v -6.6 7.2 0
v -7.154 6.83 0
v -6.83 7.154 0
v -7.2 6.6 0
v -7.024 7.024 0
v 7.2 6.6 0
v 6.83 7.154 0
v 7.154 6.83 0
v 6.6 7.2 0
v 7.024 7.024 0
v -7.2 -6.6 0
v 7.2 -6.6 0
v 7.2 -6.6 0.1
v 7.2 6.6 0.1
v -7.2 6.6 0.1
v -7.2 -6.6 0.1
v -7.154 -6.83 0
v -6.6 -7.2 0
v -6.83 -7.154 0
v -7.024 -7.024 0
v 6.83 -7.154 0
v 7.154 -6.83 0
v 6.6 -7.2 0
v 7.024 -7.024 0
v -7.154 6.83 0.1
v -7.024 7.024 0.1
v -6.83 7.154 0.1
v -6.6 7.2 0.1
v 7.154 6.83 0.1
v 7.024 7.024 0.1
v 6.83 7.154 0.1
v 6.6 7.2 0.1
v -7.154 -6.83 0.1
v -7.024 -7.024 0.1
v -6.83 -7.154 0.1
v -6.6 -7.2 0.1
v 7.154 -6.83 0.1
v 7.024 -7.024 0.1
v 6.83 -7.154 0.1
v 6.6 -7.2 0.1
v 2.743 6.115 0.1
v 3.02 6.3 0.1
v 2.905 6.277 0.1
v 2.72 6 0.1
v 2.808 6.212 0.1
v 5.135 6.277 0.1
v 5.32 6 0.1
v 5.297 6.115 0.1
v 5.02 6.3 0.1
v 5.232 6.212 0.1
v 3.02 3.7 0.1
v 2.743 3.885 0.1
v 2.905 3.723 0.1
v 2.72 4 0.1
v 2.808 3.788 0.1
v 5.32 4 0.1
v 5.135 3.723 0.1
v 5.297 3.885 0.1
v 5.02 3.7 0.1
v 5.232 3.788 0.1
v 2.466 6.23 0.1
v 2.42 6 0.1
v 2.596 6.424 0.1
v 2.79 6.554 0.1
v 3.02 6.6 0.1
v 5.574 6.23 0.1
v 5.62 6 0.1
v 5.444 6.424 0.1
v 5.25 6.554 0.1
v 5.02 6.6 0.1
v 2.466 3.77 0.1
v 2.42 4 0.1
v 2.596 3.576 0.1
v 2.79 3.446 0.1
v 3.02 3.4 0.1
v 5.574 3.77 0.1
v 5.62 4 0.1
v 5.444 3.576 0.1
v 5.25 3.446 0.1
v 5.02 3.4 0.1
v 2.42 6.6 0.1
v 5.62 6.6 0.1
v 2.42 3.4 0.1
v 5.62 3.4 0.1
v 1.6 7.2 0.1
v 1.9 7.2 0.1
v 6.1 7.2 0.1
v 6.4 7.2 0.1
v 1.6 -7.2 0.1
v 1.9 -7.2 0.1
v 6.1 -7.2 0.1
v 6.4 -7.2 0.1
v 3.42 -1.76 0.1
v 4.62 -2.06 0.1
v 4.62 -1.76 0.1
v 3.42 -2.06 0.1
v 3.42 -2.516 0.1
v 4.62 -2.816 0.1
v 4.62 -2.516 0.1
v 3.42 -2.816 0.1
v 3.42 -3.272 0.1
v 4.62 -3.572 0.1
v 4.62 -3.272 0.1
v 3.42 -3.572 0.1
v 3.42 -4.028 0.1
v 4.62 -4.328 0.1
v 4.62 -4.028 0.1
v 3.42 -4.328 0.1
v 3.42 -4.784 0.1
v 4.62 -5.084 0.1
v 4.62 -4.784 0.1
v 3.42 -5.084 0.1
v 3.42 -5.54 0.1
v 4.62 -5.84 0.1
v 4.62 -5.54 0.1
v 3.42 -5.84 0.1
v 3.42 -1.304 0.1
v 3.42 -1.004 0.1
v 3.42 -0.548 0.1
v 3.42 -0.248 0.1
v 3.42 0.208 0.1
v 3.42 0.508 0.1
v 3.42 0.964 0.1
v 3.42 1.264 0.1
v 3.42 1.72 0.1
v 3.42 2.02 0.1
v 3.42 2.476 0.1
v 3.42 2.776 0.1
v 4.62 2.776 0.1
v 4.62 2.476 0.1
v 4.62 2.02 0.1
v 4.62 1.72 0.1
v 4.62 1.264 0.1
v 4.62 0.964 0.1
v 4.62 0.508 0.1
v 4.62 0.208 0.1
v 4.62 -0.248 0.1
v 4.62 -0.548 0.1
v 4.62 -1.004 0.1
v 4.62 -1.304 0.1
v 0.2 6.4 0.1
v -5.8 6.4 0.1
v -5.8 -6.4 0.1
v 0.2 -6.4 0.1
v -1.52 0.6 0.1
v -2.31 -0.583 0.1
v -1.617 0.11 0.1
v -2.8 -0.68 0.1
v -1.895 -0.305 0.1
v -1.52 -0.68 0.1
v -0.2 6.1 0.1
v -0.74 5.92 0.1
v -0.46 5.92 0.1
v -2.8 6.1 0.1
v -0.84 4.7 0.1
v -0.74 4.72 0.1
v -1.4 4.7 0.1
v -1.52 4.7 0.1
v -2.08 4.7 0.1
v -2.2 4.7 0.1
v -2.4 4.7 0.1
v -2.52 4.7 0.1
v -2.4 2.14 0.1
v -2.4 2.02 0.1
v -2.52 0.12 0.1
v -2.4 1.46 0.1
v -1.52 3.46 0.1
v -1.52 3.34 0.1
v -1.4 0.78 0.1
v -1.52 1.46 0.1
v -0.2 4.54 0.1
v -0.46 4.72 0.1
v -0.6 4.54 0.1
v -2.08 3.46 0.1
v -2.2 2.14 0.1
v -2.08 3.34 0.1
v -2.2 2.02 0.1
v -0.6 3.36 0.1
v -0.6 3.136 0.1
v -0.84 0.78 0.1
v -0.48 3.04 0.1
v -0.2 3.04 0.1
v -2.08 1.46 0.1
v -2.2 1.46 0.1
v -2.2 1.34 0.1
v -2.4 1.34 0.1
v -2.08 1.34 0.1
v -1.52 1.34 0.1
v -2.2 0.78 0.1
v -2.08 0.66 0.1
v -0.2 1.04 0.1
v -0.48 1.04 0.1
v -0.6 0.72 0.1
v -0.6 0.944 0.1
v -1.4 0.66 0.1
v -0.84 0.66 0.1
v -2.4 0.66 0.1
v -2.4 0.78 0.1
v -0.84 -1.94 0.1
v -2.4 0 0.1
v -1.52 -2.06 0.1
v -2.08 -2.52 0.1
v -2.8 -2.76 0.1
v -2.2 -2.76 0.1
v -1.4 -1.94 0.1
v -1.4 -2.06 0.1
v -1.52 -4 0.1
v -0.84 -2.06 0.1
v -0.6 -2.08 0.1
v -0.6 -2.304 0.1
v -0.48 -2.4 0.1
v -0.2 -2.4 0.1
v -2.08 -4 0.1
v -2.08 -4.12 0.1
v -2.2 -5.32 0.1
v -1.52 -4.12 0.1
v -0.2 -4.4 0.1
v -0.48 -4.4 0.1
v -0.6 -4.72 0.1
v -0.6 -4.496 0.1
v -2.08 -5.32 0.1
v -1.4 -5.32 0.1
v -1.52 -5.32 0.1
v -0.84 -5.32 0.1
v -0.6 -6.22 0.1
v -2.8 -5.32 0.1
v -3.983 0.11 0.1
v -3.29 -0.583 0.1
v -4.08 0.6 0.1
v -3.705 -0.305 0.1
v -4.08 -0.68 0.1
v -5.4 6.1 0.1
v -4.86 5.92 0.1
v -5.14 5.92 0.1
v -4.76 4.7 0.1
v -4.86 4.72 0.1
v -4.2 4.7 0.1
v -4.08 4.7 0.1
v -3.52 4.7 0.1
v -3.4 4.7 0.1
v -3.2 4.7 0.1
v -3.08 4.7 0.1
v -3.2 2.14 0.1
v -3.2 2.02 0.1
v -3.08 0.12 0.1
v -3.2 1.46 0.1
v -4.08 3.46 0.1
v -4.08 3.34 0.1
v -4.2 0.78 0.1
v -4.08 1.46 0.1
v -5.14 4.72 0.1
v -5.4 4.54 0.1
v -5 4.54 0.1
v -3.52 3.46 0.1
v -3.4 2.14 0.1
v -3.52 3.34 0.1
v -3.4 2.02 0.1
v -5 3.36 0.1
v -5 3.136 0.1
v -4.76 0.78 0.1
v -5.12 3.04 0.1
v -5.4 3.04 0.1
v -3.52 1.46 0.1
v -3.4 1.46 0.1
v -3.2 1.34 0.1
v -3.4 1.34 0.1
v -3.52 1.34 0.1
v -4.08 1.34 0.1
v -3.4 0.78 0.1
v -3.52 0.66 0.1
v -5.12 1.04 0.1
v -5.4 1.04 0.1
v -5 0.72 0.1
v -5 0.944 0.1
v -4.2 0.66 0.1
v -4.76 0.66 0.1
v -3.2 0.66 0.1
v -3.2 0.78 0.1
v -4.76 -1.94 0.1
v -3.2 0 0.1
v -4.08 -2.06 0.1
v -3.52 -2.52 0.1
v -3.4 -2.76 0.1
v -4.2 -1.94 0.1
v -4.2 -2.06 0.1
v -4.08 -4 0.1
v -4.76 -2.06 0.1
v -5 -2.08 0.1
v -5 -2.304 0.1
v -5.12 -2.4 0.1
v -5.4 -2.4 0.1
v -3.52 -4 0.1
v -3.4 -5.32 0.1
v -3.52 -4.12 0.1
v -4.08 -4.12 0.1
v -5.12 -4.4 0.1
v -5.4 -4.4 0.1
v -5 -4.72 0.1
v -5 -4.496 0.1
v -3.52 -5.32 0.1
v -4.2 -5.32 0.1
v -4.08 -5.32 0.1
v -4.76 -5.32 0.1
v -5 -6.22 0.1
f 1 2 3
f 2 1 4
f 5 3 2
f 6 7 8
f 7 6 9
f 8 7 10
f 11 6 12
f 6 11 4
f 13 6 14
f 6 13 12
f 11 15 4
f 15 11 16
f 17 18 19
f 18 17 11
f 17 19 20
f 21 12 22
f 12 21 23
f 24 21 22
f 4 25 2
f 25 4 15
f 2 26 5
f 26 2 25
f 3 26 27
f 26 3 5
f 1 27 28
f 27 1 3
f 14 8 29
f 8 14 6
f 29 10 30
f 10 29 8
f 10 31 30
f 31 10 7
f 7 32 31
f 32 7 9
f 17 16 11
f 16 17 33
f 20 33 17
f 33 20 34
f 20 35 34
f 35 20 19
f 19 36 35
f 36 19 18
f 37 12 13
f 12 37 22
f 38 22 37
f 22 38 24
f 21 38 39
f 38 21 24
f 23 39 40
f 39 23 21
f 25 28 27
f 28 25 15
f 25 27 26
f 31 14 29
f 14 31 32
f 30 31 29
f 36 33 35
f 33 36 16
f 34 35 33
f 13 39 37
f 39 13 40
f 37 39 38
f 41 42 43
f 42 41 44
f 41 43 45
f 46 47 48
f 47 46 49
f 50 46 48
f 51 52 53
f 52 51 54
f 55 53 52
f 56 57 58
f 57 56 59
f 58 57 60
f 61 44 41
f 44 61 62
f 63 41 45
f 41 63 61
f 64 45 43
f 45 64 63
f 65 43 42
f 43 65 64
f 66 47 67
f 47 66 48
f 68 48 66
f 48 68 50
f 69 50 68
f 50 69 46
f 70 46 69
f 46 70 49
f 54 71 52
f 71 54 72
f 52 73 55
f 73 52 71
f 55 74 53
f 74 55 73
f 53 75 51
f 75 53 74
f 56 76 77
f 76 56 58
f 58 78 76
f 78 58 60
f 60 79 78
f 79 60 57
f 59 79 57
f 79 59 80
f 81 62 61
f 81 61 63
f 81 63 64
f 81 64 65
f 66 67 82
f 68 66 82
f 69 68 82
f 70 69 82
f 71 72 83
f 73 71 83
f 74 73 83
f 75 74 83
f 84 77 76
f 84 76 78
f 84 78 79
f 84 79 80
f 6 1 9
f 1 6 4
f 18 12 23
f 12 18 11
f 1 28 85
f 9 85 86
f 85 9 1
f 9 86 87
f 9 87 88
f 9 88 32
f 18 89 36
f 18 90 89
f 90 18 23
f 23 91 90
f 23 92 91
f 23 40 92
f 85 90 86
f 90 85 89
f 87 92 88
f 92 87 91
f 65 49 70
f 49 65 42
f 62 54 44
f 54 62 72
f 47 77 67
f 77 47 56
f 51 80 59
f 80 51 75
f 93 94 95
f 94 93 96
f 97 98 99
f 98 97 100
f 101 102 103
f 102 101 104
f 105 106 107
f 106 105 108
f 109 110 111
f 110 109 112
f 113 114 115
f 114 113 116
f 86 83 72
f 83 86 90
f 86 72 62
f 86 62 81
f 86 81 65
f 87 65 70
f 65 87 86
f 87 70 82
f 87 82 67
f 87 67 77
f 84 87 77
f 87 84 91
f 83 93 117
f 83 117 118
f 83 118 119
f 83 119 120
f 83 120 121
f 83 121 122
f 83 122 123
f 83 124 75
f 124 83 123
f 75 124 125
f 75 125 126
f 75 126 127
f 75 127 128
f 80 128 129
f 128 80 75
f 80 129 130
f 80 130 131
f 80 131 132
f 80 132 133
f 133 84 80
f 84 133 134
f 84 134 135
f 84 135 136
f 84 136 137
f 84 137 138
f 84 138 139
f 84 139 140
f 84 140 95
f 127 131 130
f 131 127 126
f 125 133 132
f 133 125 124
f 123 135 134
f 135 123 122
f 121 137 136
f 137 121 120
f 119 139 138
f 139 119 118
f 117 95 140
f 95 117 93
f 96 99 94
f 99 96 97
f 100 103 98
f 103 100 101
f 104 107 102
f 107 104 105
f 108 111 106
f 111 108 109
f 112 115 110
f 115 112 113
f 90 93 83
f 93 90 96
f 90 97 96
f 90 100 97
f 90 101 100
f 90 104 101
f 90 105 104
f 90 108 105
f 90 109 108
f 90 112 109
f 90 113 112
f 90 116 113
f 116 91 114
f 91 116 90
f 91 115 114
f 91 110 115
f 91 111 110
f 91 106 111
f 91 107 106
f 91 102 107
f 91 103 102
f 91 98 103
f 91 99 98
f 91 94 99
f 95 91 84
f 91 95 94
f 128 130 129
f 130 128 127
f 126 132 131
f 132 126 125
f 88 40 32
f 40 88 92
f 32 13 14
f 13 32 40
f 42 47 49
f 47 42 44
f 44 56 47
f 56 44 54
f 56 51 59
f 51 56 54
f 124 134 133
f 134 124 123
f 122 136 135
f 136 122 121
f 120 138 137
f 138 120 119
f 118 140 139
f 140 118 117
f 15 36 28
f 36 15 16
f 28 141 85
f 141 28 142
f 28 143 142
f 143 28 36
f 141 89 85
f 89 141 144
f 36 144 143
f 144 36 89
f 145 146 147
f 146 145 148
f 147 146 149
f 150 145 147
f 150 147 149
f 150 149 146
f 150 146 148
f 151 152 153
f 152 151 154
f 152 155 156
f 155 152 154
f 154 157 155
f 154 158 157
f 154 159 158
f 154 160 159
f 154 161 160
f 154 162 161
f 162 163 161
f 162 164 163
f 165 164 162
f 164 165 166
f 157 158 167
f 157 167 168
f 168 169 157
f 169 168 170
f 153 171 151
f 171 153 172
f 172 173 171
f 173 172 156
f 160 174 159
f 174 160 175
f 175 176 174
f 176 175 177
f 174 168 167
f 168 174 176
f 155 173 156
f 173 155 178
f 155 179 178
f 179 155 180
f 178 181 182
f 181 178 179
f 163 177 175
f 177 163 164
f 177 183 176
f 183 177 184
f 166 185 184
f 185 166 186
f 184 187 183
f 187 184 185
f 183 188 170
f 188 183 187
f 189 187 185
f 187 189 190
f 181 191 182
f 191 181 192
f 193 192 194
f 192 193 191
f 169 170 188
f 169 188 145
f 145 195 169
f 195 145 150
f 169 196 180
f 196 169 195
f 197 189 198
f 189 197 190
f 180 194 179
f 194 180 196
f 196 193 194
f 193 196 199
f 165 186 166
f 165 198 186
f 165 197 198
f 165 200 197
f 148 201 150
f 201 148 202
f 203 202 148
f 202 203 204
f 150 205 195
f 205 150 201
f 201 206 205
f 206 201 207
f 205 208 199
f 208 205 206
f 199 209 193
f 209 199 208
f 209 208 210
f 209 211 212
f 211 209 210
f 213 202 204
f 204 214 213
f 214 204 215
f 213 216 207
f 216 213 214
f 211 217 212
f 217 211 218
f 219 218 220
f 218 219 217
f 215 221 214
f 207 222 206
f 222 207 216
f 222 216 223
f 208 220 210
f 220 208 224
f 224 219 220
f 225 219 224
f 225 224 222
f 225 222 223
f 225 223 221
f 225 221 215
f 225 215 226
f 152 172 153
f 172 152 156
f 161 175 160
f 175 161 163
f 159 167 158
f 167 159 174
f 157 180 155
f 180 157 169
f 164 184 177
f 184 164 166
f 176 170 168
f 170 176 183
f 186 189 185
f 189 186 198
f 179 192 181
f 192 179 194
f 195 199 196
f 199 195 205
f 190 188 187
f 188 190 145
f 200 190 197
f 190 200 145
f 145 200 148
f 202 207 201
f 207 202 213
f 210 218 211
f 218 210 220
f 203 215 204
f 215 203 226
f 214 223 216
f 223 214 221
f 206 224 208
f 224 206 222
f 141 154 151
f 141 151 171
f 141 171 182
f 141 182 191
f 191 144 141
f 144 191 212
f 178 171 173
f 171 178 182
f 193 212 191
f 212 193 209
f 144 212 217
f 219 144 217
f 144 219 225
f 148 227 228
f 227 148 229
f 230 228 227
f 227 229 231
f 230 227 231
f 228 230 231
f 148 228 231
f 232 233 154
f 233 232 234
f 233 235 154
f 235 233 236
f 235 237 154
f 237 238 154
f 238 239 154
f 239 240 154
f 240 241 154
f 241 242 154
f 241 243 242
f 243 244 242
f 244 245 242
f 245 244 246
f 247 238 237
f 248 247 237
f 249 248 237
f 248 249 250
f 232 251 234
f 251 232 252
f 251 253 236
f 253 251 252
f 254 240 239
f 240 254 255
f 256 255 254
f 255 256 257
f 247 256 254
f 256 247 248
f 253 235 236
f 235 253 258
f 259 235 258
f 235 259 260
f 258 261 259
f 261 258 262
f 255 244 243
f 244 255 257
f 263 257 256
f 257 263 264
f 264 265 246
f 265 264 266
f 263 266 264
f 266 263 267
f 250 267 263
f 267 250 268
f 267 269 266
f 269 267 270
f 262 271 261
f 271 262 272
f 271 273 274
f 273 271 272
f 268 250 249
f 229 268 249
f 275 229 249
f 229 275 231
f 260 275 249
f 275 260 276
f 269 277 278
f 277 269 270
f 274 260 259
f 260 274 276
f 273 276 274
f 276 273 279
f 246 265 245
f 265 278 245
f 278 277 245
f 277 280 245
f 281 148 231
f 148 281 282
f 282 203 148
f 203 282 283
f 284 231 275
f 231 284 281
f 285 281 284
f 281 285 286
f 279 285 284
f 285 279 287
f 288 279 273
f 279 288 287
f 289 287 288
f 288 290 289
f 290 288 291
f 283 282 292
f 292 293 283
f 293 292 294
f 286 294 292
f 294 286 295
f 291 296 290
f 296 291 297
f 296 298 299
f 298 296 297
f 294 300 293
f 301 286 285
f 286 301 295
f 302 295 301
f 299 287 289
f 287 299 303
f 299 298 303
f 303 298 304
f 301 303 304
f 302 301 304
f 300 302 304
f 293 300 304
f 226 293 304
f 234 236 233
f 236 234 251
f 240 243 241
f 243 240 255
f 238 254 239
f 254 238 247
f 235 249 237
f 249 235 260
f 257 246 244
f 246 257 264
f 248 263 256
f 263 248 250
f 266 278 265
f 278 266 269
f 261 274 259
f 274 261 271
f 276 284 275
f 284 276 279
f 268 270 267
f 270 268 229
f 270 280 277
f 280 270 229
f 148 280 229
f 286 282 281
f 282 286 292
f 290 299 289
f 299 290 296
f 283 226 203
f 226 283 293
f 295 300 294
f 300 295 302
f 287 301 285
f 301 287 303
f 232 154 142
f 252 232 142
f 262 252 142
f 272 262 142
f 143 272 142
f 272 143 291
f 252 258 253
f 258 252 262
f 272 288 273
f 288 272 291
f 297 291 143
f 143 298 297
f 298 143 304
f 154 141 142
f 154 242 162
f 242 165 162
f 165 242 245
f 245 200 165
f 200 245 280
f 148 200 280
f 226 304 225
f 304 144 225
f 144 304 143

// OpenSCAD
// file: ../p/box3u12.scad
use <../lib.scad>
function ldraw_lib__box3u12() = [
// 0 Box with 3 Parallel Faces without Any Edges
// 0 Name: box3u12.dat
// 0 Author: J.C. Tchang [tchang]
// 0 !LDRAW_ORG Primitive UPDATE 2014-02
// 0 !LICENSE Licensed under CC BY 4.0 : see CAreadme.txt
// 
// 0 BFC CERTIFY CCW
  [0,"BFC","CERTIFY"],
  [0,"BFC","CCW"],
// 
// 0 !HISTORY 2014-12-23 [PTadmin] Official Update 2014-02
// 
// 
// 4 16 -1 1 1 1 1 1 1 1 -1 -1 1 -1
  [4,16,-1,1,1,1,1,1,1,1,-1,-1,1,-1],
// 4 16 -1 1 1 -1 0 1 1 0 1 1 1 1
  [4,16,-1,1,1,-1,0,1,1,0,1,1,1,1],
// 4 16 1 1 -1 1 0 -1 -1 0 -1 -1 1 -1
  [4,16,1,1,-1,1,0,-1,-1,0,-1,-1,1,-1],
];
module ldraw_lib__box3u12(step=0, col=false, unit=2/5, alt=false, line=0.2, solid=!$preview)
    makepoly(ldraw_lib__box3u12(), step=step, col=col, unit=unit, alt=alt, line=line, solid=solid);
ldraw_lib__box3u12(line=0.2);
// file: ../p/1-4ring1.scad
use <../lib.scad>
function ldraw_lib__1_4ring1() = [
// 0 Ring  1 x 0.25
// 0 Name: 1-4ring1.dat
// 0 Author: Chris Dee [cwdee]
// 0 !LDRAW_ORG Primitive UPDATE 2012-01
// 0 !LICENSE Licensed under CC BY 4.0 : see CAreadme.txt
// 
// 0 BFC CERTIFY CCW
  [0,"BFC","CERTIFY"],
  [0,"BFC","CCW"],
// 
// 0 !HISTORY 2000-05-07 [PTadmin] Official Update 2000-01
// 0 !HISTORY 2002-11-22 [hafhead] Added BFC statement
// 0 !HISTORY 2002-11-30 [PTadmin] Official Update 2002-05
// 0 !HISTORY 2007-06-22 [PTadmin] Header formatted for Contributor Agreement
// 0 !HISTORY 2008-07-01 [PTadmin] Official Update 2008-01
// 0 !HISTORY 2012-02-16 [Philo] Changed to CCW
// 0 !HISTORY 2012-03-30 [PTadmin] Official Update 2012-01
// 
// 
// 4 16 2 0 0 1.8478 0 0.7654 0.9239 0 0.3827 1 0 0
  [4,16,2,0,0,1.8478,0,0.7654,0.9239,0,0.3827,1,0,0],
// 4 16 1.8478 0 0.7654 1.4142 0 1.4142 0.7071 0 0.7071 0.9239 0 0.3827
  [4,16,1.8478,0,0.7654,1.4142,0,1.4142,0.7071,0,0.7071,0.9239,0,0.3827],
// 4 16 1.4142 0 1.4142 0.7654 0 1.8478 0.3827 0 0.9239 0.7071 0 0.7071
  [4,16,1.4142,0,1.4142,0.7654,0,1.8478,0.3827,0,0.9239,0.7071,0,0.7071],
// 4 16 0.7654 0 1.8478 0 0 2 0 0 1 0.3827 0 0.9239
  [4,16,0.7654,0,1.8478,0,0,2,0,0,1,0.3827,0,0.9239],
];
module ldraw_lib__1_4ring1(step=0, col=false, unit=2/5, alt=false, line=0.2, solid=!$preview)
    makepoly(ldraw_lib__1_4ring1(), step=step, col=col, unit=unit, alt=alt, line=line, solid=solid);
ldraw_lib__1_4ring1(line=0.2);
// file: ../p/1-4ndis.scad
use <../lib.scad>
function ldraw_lib__1_4ndis() = [
// 0 Disc Negative 0.25
// 0 Name: 1-4ndis.dat
// 0 Author: James Jessiman
// 0 !LDRAW_ORG Primitive UPDATE 2012-01
// 0 !LICENSE Licensed under CC BY 4.0 : see CAreadme.txt
// 
// 0 BFC CERTIFY CCW
  [0,"BFC","CERTIFY"],
  [0,"BFC","CCW"],
// 
// 0 !HISTORY 2002-03-23 [sbliss] Added BFC Statement
// 0 !HISTORY 2002-04-25 [PTadmin] Official Update 2002-02
// 0 !HISTORY 2007-06-22 [PTadmin] Header formatted for Contributor Agreement
// 0 !HISTORY 2008-07-01 [PTadmin] Official Update 2008-01
// 0 !HISTORY 2012-02-16 [Philo] Changed to CCW
// 0 !HISTORY 2012-03-30 [PTadmin] Official Update 2012-01
// 
// 
// 3 16 0.9239 0 0.3827 1 0 0 1 0 1
  [3,16,0.9239,0,0.3827,1,0,0,1,0,1],
// 3 16 0.7071 0 0.7071 0.9239 0 0.3827 1 0 1
  [3,16,0.7071,0,0.7071,0.9239,0,0.3827,1,0,1],
// 3 16 0.3827 0 0.9239 0.7071 0 0.7071 1 0 1
  [3,16,0.3827,0,0.9239,0.7071,0,0.7071,1,0,1],
// 3 16 0 0 1 0.3827 0 0.9239 1 0 1
  [3,16,0,0,1,0.3827,0,0.9239,1,0,1],
];
module ldraw_lib__1_4ndis(step=0, col=false, unit=2/5, alt=false, line=0.2, solid=!$preview)
    makepoly(ldraw_lib__1_4ndis(), step=step, col=col, unit=unit, alt=alt, line=line, solid=solid);
ldraw_lib__1_4ndis(line=0.2);
// file: ../p/1-4cyli.scad
use <../lib.scad>
function ldraw_lib__1_4cyli() = [
// 0 Cylinder 0.25
// 0 Name: 1-4cyli.dat
// 0 Author: James Jessiman
// 0 !LDRAW_ORG Primitive UPDATE 2012-01
// 0 !LICENSE Licensed under CC BY 4.0 : see CAreadme.txt
// 
// 0 BFC CERTIFY CCW
  [0,"BFC","CERTIFY"],
  [0,"BFC","CCW"],
// 
// 0 !HISTORY 2002-03-23 [sbliss] Added BFC statement.
// 0 !HISTORY 2002-04-25 [PTadmin] Official Update 2002-02
// 0 !HISTORY 2007-06-22 [PTadmin] Header formatted for Contributor Agreement
// 0 !HISTORY 2008-07-01 [PTadmin] Official Update 2008-01
// 0 !HISTORY 2012-02-16 [Philo] Changed to CCW
// 0 !HISTORY 2012-03-30 [PTadmin] Official Update 2012-01
// 
// 
// 4 16 1 1 0 0.9239 1 0.3827 0.9239 0 0.3827 1 0 0
  [4,16,1,1,0,0.9239,1,0.3827,0.9239,0,0.3827,1,0,0],
// 5 24 1 0 0 1 1 0 0.9239 0 0.3827 1 0 -1
  [5,24,1,0,0,1,1,0,0.9239,0,0.3827,1,0,-1],
// 4 16 0.9239 1 0.3827 0.7071 1 0.7071 0.7071 0 0.7071 0.9239 0 0.3827
  [4,16,0.9239,1,0.3827,0.7071,1,0.7071,0.7071,0,0.7071,0.9239,0,0.3827],
// 5 24 0.9239 0 0.3827 0.9239 1 0.3827 0.7071 0 0.7071 1 0 0
  [5,24,0.9239,0,0.3827,0.9239,1,0.3827,0.7071,0,0.7071,1,0,0],
// 4 16 0.7071 1 0.7071 0.3827 1 0.9239 0.3827 0 0.9239 0.7071 0 0.7071
  [4,16,0.7071,1,0.7071,0.3827,1,0.9239,0.3827,0,0.9239,0.7071,0,0.7071],
// 5 24 0.7071 0 0.7071 0.7071 1 0.7071 0.3827 0 0.9239 0.9239 0 0.3827
  [5,24,0.7071,0,0.7071,0.7071,1,0.7071,0.3827,0,0.9239,0.9239,0,0.3827],
// 4 16 0.3827 1 0.9239 0 1 1 0 0 1 0.3827 0 0.9239
  [4,16,0.3827,1,0.9239,0,1,1,0,0,1,0.3827,0,0.9239],
// 5 24 0.3827 0 0.9239 0.3827 1 0.9239 0 0 1 0.7071 0 0.7071
  [5,24,0.3827,0,0.9239,0.3827,1,0.9239,0,0,1,0.7071,0,0.7071],
// 5 24 0 0 1 0 1 1 0.3827 0 0.9239 -1 0 1
  [5,24,0,0,1,0,1,1,0.3827,0,0.9239,-1,0,1],
];
module ldraw_lib__1_4cyli(step=0, col=false, unit=2/5, alt=false, line=0.2, solid=!$preview)
    makepoly(ldraw_lib__1_4cyli(), step=step, col=col, unit=unit, alt=alt, line=line, solid=solid);
ldraw_lib__1_4cyli(line=0.2);
// file: ../p/1-4chrd.scad
use <../lib.scad>
function ldraw_lib__1_4chrd() = [
// 0 Chord 0.25
// 0 Name: 1-4chrd.dat
// 0 Author: Max Martin Richter [MMR1988]
// 0 !LDRAW_ORG Primitive UPDATE 2023-05
// 0 !LICENSE Licensed under CC BY 4.0 : see CAreadme.txt
// 
// 0 BFC CERTIFY CCW
  [0,"BFC","CERTIFY"],
  [0,"BFC","CCW"],
// 
// 0 !HISTORY 2004-04-22 [PTadmin] Official Update 2004-02
// 0 !HISTORY 2007-10-09 [PTadmin] Header formatted for Contributor Agreement
// 0 !HISTORY 2008-07-01 [PTadmin] Official Update 2008-01
// 0 !HISTORY 2012-08-02 [MMR1988] Re-creation with PrimGen2 and Rectifier
// 0 !HISTORY 2012-08-09 [PTadmin] Official Update 2012-02
// 0 !HISTORY 2023-10-27 [OrionP] Change author to MMR1988 from hafhead
// 0 !HISTORY 2023-10-31 [OrionP] Official Update 2023-05
// 
// 4 16 0.9239 0 0.3827 0.3827 0 0.9239 0 0 1 1 0 0
  [4,16,0.9239,0,0.3827,0.3827,0,0.9239,0,0,1,1,0,0],
// 3 16 0.7071 0 0.7071 0.3827 0 0.9239 0.9239 0 0.3827
  [3,16,0.7071,0,0.7071,0.3827,0,0.9239,0.9239,0,0.3827],
];
module ldraw_lib__1_4chrd(step=0, col=false, unit=2/5, alt=false, line=0.2, solid=!$preview)
    makepoly(ldraw_lib__1_4chrd(), step=step, col=col, unit=unit, alt=alt, line=line, solid=solid);
ldraw_lib__1_4chrd(line=0.2);
// main file
use <../lib.scad>
use <s/6148328cs01.scad>
use <s/6148328fs01.scad>
function ldraw_lib__6148328f() = [
// 0 Sticker  1.8 x  1.8 with White Car and Grey Stripe on White Background
// 0 Name: 6148328f.dat
// 0 Author: Massimo Maso [Sirio]
// 0 !LDRAW_ORG Part UPDATE 2024-08
// 0 !LICENSE Licensed under CC BY 4.0 : see CAreadme.txt
// 
// 0 BFC CERTIFY CCW
  [0,"BFC","CERTIFY"],
  [0,"BFC","CCW"],
// 
// 0 !KEYWORDS 917K, 919, Bricklink 75876stk01, Brickowl 852010, Hybrid, Pit Lane
// 0 !KEYWORDS Porsche, Rebrickable 26357, set 75876, Speed Champions
// 
// 0 !HISTORY 2024-09-30 [OrionP] Official Update 2024-08
// 
// 
// 0 // Subpart
// 
// 1 16 0 0 0 1 0 0 0 1 0 0 0 1 s\6148328cs01.dat
  [1,16,0,0,0,1,0,0,0,1,0,0,0,1, ldraw_lib__s__6148328cs01()],
// 1 16 -7 -.25 0 1 0 0 0 1 0 0 0 1 s\6148328fs01.dat
  [1,16,-7,-.25,0,1,0,0,0,1,0,0,0,1, ldraw_lib__s__6148328fs01()],
// 1 16 -7 -.25 0 -1 0 0 0 1 0 0 0 1 s\6148328fs01.dat
  [1,16,-7,-.25,0,-1,0,0,0,1,0,0,0,1, ldraw_lib__s__6148328fs01()],
// 0 // Complementary faces
// 3 15 -7 -.25 15.25 .5 -.25 16 -14.5 -.25 16
  [3,15,-7,-.25,15.25,.5,-.25,16,-14.5,-.25,16],
// 3 0 -7 -.25 15.25 -7.7 -.25 11.75 -6.3 -.25 11.75
  [3,0,-7,-.25,15.25,-7.7,-.25,11.75,-6.3,-.25,11.75],
// 4 15 -7.7 -.25 .3 -6.3 -.25 .3 -6.3 -.25 11.75 -7.7 -.25 11.75
  [4,15,-7.7,-.25,.3,-6.3,-.25,.3,-6.3,-.25,11.75,-7.7,-.25,11.75],
// 4 0 -7.7 -.25 .3 -8 -.25 0 -6 -.25 0 -6.3 -.25 .3
  [4,0,-7.7,-.25,.3,-8,-.25,0,-6,-.25,0,-6.3,-.25,.3],
// 3 15 -7 -.25 -1.7 -6 -.25 0 -8 -.25 0
  [3,15,-7,-.25,-1.7,-6,-.25,0,-8,-.25,0],
// 3 0 -7 -.25 -13.3 -12.5 -.25 -15.55 -1.5 -.25 -15.55
  [3,0,-7,-.25,-13.3,-12.5,-.25,-15.55,-1.5,-.25,-15.55],
// 4 15 -12.5 -.25 -15.55 -14.5 -.25 -16 .5 -.25 -16 -1.5 -.25 -15.55
  [4,15,-12.5,-.25,-15.55,-14.5,-.25,-16,.5,-.25,-16,-1.5,-.25,-15.55],
];
module ldraw_lib__6148328f(step=0, col=false, unit=2/5, alt=false, line=0.2, solid=!$preview)
    makepoly(ldraw_lib__6148328f(), step=step, col=col, unit=unit, alt=alt, line=line, solid=solid);
ldraw_lib__6148328f(line=0.2);
